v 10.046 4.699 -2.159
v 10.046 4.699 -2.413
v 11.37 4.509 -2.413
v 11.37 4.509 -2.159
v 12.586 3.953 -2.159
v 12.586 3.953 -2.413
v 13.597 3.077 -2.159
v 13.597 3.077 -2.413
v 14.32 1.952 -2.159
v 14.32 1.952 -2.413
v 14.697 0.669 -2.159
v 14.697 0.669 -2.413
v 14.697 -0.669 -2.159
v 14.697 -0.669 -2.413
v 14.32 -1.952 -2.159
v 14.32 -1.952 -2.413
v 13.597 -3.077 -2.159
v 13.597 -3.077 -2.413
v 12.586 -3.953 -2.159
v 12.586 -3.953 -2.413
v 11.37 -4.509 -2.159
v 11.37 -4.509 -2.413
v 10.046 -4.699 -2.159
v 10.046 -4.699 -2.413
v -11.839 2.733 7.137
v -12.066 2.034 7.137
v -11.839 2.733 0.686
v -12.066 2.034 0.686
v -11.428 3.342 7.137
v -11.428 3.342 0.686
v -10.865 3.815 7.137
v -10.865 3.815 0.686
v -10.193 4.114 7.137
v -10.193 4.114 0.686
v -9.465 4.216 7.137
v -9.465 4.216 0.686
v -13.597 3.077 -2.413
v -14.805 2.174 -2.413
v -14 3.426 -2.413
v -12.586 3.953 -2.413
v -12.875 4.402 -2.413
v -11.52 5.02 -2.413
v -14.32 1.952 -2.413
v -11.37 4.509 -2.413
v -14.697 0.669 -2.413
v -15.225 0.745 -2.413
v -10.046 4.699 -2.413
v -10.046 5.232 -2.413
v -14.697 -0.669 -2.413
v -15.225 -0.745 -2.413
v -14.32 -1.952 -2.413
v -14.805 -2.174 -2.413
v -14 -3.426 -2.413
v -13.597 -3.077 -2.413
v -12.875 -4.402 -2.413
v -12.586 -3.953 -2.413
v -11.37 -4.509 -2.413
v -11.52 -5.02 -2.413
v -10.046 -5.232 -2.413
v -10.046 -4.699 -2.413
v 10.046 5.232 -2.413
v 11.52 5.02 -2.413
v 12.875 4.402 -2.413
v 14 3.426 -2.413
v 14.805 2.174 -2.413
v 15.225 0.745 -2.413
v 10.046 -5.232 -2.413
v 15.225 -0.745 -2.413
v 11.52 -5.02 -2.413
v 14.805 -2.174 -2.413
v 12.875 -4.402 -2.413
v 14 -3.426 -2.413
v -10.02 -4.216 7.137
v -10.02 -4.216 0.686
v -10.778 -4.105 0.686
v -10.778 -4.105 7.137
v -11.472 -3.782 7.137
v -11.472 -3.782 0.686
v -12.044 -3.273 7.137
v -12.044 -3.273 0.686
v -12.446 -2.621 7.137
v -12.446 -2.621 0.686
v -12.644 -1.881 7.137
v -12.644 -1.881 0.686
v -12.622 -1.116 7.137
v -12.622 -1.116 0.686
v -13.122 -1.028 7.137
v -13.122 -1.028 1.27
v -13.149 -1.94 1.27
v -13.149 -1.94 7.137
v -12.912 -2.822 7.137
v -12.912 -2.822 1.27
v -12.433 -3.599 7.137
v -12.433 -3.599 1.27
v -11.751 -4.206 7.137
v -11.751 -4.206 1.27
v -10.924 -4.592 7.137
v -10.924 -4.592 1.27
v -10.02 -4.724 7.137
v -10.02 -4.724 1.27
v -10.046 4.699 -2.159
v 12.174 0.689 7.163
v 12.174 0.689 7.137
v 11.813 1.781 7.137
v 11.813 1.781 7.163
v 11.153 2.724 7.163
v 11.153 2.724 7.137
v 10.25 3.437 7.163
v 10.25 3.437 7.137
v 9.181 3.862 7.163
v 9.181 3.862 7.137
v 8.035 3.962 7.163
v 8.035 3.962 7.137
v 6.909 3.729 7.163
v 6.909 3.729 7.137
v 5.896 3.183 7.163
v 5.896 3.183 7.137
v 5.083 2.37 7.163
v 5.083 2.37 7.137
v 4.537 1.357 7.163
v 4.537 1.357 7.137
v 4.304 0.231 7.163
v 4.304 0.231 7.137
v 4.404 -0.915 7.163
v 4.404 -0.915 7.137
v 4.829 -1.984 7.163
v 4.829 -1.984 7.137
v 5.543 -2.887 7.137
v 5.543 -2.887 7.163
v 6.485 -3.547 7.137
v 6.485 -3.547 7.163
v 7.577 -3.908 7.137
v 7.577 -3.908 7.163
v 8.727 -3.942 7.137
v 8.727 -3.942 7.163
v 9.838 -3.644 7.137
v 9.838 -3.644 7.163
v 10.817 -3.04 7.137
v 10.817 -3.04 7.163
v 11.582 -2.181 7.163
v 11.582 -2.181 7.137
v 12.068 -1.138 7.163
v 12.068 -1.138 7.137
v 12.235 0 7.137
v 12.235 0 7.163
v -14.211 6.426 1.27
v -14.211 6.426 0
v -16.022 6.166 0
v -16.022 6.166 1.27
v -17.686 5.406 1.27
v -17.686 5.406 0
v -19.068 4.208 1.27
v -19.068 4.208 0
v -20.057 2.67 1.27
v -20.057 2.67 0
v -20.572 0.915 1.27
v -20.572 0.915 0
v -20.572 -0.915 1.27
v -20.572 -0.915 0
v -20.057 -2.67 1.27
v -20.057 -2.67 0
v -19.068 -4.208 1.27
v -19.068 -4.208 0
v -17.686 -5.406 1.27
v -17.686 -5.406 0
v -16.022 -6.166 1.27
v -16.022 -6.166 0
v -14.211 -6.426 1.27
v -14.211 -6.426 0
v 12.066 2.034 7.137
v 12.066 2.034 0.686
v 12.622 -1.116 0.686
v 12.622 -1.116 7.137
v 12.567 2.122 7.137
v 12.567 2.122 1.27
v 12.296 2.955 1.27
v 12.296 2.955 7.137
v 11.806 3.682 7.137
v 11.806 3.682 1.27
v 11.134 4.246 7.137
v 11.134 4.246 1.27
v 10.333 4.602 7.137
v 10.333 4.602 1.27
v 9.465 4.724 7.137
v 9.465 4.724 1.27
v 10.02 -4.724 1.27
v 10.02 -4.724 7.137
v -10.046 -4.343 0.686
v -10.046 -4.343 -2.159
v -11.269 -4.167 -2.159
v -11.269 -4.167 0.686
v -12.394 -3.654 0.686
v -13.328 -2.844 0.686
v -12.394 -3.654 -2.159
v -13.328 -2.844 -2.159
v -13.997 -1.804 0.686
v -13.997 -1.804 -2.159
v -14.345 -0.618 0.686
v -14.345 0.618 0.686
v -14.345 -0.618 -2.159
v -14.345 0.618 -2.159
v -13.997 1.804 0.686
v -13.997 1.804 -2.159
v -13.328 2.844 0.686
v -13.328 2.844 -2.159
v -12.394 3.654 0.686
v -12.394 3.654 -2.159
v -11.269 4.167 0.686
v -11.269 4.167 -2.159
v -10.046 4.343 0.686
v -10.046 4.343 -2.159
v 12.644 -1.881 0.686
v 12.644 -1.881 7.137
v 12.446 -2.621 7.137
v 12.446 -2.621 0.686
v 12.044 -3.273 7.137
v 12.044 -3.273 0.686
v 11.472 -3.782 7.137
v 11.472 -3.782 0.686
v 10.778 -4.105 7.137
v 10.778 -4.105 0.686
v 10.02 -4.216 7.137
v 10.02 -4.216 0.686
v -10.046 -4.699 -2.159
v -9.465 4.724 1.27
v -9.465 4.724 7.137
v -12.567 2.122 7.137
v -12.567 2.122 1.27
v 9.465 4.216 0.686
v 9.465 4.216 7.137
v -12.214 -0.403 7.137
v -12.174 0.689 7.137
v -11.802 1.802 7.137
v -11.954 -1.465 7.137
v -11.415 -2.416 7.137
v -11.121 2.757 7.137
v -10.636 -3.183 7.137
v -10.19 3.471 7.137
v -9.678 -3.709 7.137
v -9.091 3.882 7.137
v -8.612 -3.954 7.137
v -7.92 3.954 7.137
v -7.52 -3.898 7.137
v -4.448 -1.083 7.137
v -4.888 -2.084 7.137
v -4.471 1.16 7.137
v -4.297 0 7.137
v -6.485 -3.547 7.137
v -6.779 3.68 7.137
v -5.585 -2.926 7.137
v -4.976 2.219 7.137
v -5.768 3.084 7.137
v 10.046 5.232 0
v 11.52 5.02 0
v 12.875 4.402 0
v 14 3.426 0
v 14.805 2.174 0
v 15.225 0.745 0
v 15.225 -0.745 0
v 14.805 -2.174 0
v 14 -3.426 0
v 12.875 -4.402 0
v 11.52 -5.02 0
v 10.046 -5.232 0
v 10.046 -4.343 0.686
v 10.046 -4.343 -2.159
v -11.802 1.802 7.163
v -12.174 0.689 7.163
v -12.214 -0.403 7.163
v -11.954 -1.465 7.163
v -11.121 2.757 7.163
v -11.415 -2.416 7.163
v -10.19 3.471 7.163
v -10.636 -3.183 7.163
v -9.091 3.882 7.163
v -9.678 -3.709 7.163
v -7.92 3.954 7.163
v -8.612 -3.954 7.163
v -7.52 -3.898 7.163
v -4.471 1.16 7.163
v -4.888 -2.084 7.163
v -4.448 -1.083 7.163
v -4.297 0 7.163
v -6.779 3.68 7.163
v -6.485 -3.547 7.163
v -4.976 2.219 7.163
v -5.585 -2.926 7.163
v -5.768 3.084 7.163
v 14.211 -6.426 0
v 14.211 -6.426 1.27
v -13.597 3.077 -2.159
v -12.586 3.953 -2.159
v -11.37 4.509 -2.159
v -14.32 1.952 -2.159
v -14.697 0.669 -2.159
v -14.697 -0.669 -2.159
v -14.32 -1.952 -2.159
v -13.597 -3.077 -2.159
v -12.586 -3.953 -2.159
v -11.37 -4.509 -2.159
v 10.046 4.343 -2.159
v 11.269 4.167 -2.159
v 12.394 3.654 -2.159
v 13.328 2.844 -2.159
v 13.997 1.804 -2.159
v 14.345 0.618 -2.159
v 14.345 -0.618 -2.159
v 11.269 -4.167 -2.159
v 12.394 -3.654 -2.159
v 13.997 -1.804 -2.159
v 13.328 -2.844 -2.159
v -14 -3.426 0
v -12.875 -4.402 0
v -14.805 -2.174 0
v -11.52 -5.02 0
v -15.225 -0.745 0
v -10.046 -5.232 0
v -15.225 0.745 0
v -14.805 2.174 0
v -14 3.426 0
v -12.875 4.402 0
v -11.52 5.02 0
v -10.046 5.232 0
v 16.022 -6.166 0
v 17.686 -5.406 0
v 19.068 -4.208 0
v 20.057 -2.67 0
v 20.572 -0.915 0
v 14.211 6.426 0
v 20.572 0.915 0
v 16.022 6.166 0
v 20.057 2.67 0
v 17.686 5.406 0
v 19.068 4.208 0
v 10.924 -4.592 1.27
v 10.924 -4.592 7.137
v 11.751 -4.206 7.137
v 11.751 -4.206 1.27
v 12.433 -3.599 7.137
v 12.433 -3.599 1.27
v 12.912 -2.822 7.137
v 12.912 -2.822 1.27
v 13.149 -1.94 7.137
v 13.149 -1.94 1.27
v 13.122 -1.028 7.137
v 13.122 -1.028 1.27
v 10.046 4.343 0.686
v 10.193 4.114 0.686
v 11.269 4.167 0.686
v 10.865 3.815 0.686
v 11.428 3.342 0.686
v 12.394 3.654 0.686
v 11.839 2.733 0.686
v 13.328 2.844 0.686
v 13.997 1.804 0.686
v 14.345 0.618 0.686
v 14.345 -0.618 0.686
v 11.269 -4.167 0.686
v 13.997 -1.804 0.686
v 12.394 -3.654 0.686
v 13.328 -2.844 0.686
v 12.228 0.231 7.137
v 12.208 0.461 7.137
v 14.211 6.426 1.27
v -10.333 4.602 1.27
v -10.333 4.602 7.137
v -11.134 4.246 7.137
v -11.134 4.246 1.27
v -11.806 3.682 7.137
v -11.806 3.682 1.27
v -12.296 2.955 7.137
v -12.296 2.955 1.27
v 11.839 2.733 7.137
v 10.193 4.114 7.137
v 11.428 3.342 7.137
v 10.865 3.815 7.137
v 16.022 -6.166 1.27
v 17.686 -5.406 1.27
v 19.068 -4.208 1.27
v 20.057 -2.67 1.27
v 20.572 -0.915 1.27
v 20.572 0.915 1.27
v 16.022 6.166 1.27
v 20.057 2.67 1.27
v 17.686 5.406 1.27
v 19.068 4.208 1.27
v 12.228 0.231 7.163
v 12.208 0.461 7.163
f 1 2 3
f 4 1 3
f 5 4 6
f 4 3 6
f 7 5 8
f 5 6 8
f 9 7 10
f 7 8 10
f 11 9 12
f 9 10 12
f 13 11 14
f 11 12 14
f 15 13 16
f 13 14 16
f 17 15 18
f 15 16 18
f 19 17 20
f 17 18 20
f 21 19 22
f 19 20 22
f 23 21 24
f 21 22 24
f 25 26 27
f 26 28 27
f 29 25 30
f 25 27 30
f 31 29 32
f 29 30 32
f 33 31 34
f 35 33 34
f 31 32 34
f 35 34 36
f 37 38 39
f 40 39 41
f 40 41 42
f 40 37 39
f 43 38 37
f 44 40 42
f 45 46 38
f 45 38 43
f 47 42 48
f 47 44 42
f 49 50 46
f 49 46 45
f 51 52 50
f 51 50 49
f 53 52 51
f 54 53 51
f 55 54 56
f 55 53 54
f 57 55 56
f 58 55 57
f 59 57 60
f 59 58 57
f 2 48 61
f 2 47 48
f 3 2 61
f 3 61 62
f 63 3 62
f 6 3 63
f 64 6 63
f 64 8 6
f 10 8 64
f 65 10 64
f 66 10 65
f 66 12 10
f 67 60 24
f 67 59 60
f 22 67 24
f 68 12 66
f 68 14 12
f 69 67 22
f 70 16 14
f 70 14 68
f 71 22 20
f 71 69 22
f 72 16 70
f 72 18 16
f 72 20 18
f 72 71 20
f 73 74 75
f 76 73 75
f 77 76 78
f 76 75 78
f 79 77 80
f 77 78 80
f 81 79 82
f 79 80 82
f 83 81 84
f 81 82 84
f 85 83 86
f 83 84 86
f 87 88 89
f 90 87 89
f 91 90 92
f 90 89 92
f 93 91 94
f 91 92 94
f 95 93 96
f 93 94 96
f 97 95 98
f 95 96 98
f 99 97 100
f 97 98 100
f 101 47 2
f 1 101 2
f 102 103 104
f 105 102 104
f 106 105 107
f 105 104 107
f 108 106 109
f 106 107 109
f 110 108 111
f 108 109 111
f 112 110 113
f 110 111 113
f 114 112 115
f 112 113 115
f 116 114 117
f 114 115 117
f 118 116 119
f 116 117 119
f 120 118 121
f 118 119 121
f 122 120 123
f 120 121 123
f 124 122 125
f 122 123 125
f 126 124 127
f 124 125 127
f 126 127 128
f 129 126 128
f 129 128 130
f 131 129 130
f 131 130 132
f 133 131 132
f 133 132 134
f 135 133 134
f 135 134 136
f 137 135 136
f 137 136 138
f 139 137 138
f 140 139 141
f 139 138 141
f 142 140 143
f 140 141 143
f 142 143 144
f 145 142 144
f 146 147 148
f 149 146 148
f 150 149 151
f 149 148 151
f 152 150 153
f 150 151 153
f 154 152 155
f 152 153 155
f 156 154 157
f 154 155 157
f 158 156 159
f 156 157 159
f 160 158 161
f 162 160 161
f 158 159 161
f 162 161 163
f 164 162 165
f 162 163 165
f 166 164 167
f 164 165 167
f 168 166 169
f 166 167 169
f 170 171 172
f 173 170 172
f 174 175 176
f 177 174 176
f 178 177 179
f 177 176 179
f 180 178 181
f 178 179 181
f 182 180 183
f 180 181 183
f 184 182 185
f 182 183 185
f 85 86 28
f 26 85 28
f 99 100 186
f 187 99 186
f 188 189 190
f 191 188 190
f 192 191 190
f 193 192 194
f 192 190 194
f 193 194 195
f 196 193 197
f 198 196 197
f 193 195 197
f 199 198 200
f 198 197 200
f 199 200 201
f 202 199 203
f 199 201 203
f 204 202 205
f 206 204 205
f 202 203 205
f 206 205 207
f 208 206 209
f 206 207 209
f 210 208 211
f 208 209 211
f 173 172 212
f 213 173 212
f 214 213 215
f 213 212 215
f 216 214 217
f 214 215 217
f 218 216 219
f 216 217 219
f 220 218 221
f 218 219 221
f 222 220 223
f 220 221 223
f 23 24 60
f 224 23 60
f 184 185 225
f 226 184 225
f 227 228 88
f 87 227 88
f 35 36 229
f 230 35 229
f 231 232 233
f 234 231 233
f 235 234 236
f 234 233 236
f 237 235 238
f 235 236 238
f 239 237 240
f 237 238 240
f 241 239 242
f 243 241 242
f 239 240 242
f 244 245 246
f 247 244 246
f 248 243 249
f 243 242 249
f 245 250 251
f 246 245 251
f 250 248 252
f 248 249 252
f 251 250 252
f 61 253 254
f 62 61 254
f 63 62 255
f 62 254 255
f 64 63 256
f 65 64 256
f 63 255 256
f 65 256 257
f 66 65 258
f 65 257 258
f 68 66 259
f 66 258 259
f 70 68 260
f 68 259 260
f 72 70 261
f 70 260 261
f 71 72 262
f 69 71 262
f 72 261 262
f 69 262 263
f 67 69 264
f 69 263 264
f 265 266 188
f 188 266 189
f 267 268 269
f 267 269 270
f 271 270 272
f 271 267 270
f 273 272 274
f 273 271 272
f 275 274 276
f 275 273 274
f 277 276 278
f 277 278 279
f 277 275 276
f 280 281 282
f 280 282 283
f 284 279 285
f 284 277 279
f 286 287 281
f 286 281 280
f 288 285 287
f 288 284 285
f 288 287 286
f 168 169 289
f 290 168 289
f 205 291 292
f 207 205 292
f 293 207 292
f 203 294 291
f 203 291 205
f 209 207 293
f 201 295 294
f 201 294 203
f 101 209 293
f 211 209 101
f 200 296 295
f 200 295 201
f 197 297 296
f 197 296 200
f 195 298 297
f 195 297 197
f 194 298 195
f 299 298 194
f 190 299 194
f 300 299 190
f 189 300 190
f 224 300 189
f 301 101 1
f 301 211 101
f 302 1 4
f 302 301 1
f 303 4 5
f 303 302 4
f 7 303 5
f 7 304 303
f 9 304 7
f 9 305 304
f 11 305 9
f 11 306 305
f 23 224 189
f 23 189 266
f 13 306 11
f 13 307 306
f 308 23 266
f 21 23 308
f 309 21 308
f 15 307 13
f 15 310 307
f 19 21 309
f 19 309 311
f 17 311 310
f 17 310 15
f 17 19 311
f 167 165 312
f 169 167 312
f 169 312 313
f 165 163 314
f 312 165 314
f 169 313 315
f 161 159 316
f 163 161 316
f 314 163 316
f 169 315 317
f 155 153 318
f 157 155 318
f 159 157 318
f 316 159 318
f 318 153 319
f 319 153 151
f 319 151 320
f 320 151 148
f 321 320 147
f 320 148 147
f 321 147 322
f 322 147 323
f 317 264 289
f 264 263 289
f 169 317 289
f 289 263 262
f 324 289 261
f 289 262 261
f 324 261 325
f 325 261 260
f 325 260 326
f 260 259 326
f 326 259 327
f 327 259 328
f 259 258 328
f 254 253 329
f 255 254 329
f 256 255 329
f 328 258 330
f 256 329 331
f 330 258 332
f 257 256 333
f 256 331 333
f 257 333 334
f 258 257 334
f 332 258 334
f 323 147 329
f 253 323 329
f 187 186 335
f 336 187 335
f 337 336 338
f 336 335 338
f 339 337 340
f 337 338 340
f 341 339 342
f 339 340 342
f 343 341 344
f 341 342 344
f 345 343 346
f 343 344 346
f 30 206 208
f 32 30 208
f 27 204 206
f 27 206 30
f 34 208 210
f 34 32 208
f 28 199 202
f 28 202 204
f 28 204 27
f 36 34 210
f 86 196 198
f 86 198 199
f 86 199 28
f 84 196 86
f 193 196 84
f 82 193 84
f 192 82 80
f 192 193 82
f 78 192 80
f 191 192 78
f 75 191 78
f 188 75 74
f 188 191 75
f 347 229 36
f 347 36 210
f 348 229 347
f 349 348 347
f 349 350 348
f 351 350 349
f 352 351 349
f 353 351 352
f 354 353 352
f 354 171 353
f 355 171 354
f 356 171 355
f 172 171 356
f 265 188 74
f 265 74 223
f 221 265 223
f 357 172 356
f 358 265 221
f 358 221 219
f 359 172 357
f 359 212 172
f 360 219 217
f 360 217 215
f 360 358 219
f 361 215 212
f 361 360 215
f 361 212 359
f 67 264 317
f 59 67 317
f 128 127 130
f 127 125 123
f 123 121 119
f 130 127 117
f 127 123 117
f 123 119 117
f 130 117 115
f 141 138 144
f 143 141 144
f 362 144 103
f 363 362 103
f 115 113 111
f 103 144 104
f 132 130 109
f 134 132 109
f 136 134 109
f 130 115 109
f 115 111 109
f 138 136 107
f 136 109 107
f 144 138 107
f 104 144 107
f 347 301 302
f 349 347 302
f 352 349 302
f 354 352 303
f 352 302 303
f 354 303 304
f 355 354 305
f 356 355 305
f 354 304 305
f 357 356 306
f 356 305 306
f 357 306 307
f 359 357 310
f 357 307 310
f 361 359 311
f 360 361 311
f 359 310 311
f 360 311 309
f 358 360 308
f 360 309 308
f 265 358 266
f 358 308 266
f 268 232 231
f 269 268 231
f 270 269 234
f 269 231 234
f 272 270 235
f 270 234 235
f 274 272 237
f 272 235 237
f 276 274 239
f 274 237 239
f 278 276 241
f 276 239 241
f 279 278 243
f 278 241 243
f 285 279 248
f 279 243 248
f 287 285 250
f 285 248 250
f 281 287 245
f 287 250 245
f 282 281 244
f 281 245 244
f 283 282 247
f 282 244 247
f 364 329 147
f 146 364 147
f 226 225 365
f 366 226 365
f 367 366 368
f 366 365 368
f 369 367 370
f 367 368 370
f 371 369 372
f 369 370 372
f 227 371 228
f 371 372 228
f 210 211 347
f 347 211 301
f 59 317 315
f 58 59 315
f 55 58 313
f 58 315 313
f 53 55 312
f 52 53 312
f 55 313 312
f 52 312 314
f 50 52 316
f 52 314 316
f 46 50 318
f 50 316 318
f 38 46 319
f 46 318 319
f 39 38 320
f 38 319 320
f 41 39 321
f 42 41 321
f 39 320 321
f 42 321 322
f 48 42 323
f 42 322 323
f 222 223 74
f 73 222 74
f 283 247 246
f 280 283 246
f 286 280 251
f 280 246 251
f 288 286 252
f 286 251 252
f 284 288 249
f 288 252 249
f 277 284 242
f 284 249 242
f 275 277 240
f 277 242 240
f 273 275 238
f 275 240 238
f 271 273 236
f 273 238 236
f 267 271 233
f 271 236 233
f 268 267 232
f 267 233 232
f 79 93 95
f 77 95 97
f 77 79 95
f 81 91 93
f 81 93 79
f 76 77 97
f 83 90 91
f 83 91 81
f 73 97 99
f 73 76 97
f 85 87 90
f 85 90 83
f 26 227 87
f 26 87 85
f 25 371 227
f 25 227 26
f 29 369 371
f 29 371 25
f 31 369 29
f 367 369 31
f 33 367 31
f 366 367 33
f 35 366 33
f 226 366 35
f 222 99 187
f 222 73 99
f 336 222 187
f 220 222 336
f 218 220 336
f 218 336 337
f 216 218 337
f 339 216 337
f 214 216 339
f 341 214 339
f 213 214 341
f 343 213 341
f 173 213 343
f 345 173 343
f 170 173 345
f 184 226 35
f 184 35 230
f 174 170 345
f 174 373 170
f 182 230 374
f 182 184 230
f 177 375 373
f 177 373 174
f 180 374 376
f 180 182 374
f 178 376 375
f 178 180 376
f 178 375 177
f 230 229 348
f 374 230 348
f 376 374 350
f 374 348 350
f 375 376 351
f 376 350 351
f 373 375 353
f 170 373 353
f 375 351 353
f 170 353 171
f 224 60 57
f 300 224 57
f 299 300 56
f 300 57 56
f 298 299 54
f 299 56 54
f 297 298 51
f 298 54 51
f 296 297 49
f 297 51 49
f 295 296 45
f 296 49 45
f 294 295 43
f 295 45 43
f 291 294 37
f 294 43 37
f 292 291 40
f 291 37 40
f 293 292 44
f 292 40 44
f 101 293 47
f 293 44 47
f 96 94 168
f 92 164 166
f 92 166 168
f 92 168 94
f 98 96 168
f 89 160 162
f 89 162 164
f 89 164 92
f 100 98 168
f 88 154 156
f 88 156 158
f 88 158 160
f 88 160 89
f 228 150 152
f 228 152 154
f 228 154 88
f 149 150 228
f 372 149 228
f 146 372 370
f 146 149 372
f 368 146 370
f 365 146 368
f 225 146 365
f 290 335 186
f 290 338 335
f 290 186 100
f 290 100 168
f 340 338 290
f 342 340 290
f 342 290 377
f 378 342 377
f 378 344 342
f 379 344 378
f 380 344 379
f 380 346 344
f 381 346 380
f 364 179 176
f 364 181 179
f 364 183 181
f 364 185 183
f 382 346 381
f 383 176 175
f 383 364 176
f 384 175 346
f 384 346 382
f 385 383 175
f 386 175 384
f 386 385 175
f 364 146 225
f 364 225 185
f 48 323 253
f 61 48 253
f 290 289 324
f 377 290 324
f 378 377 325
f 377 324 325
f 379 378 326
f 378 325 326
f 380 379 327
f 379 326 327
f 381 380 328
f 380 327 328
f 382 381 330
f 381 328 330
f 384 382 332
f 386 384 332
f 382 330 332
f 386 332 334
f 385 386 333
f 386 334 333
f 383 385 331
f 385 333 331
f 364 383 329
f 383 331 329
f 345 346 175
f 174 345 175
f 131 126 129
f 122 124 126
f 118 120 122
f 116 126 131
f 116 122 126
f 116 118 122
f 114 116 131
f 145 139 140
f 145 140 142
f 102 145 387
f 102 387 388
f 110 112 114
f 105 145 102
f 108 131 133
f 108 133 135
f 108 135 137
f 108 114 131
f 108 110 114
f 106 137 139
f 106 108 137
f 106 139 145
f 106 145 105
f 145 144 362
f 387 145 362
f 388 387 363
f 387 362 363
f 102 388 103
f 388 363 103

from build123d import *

# Parameters (mm, degrees)
F1_DEPTH      = 1.27
F3_DEPTH      = 2.413
F5_DEPTH      = 3.0988
F6_DEPTH      = 0.254
F8_DEPTH      = 3.684
F8_DEPTH_BACK = 5.8674
F9_DEPTH      = 5.8674
F11_DEPTH     = 0.0254


# Not quite as in the source:
# - an extrude ends at something that could not be found from the text; its depth is read off the source's solid


with BuildPart() as f1:
    # F0 (on Top) → F1 (new body)
    with BuildSketch(Plane.XY):
        with BuildLine():
            ThreePointArc((-14.2113, 6.4262), (-20.6375, 0), (-14.2113, -6.4262))
            Line((-14.2113, -6.4262), (14.2113, -6.4262))
            ThreePointArc((14.2113, -6.4262), (20.6375, 0), (14.2113, 6.4262))
            Line((14.2113, 6.4262), (-14.2113, 6.4262))
        make_face()
    extrude(amount=F1_DEPTH)

    # F2 (on face) → F3 (join)
    with BuildSketch(Plane(origin=(0, 0, 0), x_dir=(1, 0, 0), z_dir=(0, 0, -1))):
        with BuildLine():
            ThreePointArc((-10.0457, 5.2324), (-15.2781, 0), (-10.0457, -5.2324))
            Line((-10.0457, -5.2324), (10.0457, -5.2324))
            ThreePointArc((10.0457, -5.2324), (15.2781, 0), (10.0457, 5.2324))
            Line((10.0457, 5.2324), (-10.0457, 5.2324))
        make_face()
    extrude(amount=F3_DEPTH)

    # F4 (on face) → F5 (cut)
    with BuildSketch(Plane(origin=(0, 0, -2.413), x_dir=(1, 0, 0), z_dir=(0, 0, -1))):
        with BuildLine():
            ThreePointArc((10.0457, -4.3434), (14.3891, 0), (10.0457, 4.3434))
            Line((10.0457, 4.3434), (-10.0457, 4.3434))
            ThreePointArc((-10.0457, 4.3434), (-14.3891, 0), (-10.0457, -4.3434))
            Line((-10.0457, -4.3434), (10.0457, -4.3434))
        make_face()
    extrude(amount=-F5_DEPTH, mode=Mode.SUBTRACT)

    # F4 (on face) → F6 (cut)
    with BuildSketch(Plane(origin=(0, 0, -2.413), x_dir=(1, 0, 0), z_dir=(0, 0, -1))):
        with BuildLine():
            ThreePointArc((10.0457, -4.699), (14.7447, 0), (10.0457, 4.699))
            Line((10.0457, 4.699), (-10.0457, 4.699))
            ThreePointArc((-10.0457, 4.699), (-14.7447, 0), (-10.0457, -4.699))
            Line((-10.0457, -4.699), (10.0457, -4.699))
        make_face()
        with BuildLine():
            Line((-10.0457, 4.3434), (10.0457, 4.3434))
            ThreePointArc((10.0457, 4.3434), (14.3891, 0), (10.0457, -4.3434))
            Line((10.0457, -4.3434), (-10.0457, -4.3434))
            ThreePointArc((-10.0457, -4.3434), (-14.3891, 0), (-10.0457, 4.3434))
        make_face(mode=Mode.SUBTRACT)
    extrude(amount=-F6_DEPTH, mode=Mode.SUBTRACT)

    # F7 (on face) → F8 (cut, two sides)
    with BuildSketch(Plane.XY.offset(1.27)) as f8_sk:
        with BuildLine():
            Line((9.4649405416, 4.2164), (-9.4649405416, 4.2164))
            ThreePointArc((-9.4649405416, 4.2164), (-11.1629282913, 3.5983830009), (-12.0664087019, 2.0335090261))
            Line((-12.0664087019, 2.0335090261), (-12.6217681604, -1.1160909739))
            ThreePointArc((-12.6217681604, -1.1160909739), (-12.0438830009, -3.2727877497), (-10.0203, -4.2164))
            Line((-10.0203, -4.2164), (10.0203, -4.2164))
            ThreePointArc((10.0203, -4.2164), (12.0438830009, -3.2727877497), (12.6217681604, -1.1160909739))
            Line((12.6217681604, -1.1160909739), (12.0664087019, 2.0335090261))
            ThreePointArc((12.0664087019, 2.0335090261), (11.1629282913, 3.5983830009), (9.4649405416, 4.2164))
        make_face()
    extrude(amount=-F8_DEPTH, mode=Mode.SUBTRACT)
    extrude(f8_sk.sketch, amount=F8_DEPTH_BACK, mode=Mode.SUBTRACT)

    # F7 (on face) → F9 (join)
    with BuildSketch(Plane.XY.offset(1.27)):
        with BuildLine():
            Line((9.4649405416, 4.7244), (-9.4649405416, 4.7244))
            ThreePointArc((-9.4649405416, 4.7244), (-11.489464397, 3.987533578), (-12.5666910404, 2.1217223004))
            Line((-12.5666910404, 2.1217223004), (-13.1220504989, -1.0278776996))
            ThreePointArc((-13.1220504989, -1.0278776996), (-12.433033578, -3.5993238555), (-10.0203, -4.7244))
            Line((-10.0203, -4.7244), (10.0203, -4.7244))
            ThreePointArc((10.0203, -4.7244), (12.433033578, -3.5993238555), (13.1220504989, -1.0278776996))
            Line((13.1220504989, -1.0278776996), (12.5666910404, 2.1217223004))
            ThreePointArc((12.5666910404, 2.1217223004), (11.489464397, 3.987533578), (9.4649405416, 4.7244))
        make_face()
        with BuildLine():
            ThreePointArc((-12.0664087019, 2.0335090261), (-11.1629282913, 3.5983830009), (-9.4649405416, 4.2164))
            Line((-9.4649405416, 4.2164), (9.4649405416, 4.2164))
            ThreePointArc((9.4649405416, 4.2164), (11.1629282913, 3.5983830009), (12.0664087019, 2.0335090261))
            Line((12.0664087019, 2.0335090261), (12.6217681604, -1.1160909739))
            ThreePointArc((12.6217681604, -1.1160909739), (12.0438830009, -3.2727877497), (10.0203, -4.2164))
            Line((10.0203, -4.2164), (-10.0203, -4.2164))
            ThreePointArc((-10.0203, -4.2164), (-12.0438830009, -3.2727877497), (-12.6217681604, -1.1160909739))
            Line((-12.6217681604, -1.1160909739), (-12.0664087019, 2.0335090261))
        make_face(mode=Mode.SUBTRACT)
    extrude(amount=F9_DEPTH)


with BuildPart() as f11:
    # F10 (on face) → F11 (new body)
    with BuildSketch(Plane.XY.offset(7.1374)):
        with BuildLine():
            ThreePointArc((-4.2972876631, 0), (-7.9201383338, 3.9536477102), (-12.1744934415, 0.6891661563))
            ThreePointArc((-12.1744934415, 0.6891661563), (-8.6119369925, -3.9536477102), (-4.2972876631, 0))
        make_face()
    extrude(amount=F11_DEPTH)


with BuildPart() as f11b:
    # F10 (on face) → F11, piece 2 (new body)
    with BuildSketch(Plane.XY.offset(7.1374)):
        with BuildLine():
            ThreePointArc((12.2347876631, 0), (12.2196853686, 0.3458993835), (12.1744934226, 0.6891662634))
            ThreePointArc((12.1744934226, 0.6891662634), (4.3123899576, -0.3458993835), (12.2347876631, 0))
        make_face()
    extrude(amount=F11_DEPTH)


solid = Compound([f1.part, f11.part, f11b.part])
